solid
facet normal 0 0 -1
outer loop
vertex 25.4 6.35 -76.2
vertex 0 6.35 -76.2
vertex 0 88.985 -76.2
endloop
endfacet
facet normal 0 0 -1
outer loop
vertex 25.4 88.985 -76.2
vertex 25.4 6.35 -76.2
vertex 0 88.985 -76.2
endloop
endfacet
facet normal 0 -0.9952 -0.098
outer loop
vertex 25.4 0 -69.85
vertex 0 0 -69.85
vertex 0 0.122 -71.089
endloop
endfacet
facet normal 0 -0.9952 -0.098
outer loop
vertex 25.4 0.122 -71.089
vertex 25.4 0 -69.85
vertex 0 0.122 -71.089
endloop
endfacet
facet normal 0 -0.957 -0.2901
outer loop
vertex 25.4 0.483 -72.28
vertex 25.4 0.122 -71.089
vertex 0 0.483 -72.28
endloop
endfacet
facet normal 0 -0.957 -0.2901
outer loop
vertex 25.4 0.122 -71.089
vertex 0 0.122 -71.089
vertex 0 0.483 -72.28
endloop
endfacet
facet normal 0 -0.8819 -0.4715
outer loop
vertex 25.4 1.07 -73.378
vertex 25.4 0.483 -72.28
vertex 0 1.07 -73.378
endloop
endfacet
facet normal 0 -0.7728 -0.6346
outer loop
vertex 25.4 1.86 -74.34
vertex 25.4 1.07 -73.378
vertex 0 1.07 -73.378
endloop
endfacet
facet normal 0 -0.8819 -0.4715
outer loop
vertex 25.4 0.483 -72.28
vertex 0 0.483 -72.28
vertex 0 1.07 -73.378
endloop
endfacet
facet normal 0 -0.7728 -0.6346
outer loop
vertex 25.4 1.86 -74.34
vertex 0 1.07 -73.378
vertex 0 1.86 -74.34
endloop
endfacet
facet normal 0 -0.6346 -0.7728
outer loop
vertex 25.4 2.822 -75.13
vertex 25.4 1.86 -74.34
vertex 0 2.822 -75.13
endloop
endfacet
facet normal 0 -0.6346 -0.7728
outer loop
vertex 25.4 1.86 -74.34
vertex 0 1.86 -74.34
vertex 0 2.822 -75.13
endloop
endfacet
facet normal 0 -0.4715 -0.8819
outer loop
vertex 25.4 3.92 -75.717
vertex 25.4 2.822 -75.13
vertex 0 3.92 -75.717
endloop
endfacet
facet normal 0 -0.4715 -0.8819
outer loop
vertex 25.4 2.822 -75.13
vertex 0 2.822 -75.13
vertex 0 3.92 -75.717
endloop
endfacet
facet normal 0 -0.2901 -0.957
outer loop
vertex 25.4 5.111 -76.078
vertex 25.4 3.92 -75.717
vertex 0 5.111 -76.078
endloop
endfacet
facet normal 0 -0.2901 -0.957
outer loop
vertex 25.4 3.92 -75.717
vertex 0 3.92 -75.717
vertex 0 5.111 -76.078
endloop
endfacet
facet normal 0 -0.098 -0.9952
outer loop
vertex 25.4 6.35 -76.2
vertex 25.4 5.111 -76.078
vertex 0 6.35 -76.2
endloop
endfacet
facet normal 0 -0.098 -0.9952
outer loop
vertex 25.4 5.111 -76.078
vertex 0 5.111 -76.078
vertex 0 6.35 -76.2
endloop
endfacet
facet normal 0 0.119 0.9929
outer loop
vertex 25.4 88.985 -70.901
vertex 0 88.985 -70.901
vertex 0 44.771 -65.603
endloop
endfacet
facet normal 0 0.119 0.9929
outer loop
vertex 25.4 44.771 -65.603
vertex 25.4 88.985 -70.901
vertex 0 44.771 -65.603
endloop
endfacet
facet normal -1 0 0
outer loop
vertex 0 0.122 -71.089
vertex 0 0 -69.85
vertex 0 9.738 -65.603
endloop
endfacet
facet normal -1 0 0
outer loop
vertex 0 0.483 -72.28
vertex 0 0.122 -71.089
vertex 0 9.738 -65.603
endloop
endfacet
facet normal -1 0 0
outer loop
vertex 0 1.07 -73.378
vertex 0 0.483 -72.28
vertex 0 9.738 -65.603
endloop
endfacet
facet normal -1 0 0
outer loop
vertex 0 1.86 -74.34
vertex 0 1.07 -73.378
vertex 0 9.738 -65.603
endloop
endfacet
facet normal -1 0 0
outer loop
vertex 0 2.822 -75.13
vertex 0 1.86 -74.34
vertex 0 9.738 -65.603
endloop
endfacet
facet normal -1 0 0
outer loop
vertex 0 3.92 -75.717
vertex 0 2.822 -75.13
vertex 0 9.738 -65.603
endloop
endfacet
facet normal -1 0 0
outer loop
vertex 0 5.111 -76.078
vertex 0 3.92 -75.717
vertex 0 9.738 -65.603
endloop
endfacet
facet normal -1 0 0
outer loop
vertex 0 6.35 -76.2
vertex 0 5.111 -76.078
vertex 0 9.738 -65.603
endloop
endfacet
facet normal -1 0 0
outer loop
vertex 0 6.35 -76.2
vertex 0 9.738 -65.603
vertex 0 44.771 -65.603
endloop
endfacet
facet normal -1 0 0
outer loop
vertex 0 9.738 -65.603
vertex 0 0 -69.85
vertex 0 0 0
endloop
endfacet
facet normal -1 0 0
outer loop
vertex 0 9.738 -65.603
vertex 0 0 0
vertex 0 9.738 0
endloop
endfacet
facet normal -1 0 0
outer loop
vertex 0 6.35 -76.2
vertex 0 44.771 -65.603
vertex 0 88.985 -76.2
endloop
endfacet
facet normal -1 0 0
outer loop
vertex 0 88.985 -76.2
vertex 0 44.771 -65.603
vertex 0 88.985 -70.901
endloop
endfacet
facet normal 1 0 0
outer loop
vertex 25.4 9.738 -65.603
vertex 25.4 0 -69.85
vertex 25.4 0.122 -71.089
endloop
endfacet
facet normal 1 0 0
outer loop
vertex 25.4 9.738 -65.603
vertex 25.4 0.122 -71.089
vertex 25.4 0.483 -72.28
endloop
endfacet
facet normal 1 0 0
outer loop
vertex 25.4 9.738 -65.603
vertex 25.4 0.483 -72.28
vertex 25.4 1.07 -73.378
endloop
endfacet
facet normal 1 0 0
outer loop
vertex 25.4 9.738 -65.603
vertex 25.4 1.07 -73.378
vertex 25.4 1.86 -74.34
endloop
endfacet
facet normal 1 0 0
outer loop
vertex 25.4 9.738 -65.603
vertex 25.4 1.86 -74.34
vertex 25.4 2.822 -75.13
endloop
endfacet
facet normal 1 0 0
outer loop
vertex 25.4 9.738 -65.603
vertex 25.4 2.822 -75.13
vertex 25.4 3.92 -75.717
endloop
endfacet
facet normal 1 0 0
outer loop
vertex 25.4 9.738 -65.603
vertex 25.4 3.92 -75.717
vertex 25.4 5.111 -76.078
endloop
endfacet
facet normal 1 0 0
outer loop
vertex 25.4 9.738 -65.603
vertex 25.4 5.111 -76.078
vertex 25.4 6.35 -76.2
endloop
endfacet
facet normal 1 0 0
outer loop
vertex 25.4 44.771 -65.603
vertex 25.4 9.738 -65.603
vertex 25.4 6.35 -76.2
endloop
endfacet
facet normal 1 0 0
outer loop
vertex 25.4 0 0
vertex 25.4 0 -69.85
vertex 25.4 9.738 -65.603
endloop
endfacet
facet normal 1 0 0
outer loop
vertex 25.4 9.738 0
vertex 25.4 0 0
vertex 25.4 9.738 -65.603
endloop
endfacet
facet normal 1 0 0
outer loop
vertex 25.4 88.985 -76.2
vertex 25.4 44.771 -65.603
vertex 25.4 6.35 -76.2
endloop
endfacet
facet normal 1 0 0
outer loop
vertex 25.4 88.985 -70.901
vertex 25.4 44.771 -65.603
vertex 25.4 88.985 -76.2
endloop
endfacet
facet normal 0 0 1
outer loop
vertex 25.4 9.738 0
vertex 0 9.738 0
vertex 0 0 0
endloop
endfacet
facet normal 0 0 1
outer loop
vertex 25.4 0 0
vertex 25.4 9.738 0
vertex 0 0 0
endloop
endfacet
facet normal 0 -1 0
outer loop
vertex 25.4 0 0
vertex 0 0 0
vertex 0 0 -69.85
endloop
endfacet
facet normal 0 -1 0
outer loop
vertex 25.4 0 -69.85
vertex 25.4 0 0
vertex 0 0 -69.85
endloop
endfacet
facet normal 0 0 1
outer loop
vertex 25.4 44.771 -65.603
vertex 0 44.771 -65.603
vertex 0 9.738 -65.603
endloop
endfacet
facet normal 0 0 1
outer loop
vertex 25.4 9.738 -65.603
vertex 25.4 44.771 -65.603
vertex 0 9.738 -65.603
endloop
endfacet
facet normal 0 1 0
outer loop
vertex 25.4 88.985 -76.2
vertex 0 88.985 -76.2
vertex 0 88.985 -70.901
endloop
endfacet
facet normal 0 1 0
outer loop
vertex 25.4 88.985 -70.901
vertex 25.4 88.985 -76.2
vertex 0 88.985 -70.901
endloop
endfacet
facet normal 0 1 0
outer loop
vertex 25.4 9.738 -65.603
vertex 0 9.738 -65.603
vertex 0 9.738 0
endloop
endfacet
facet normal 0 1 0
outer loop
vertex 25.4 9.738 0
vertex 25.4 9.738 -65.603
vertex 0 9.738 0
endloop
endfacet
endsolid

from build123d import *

# Parameters (mm, degrees)
F1_DEPTH = 25.4


with BuildPart() as f1:
    # F0 (on Right) → F1 (new body)
    with BuildSketch(Plane.YZ):
        with BuildLine():
            Line((9.737576, 0), (0, 0))
            Line((0, 0), (0, -69.85))
            ThreePointArc((0, -69.85), (1.859872, -74.340128), (6.35, -76.2))
            Line((6.35, -76.2), (88.985146, -76.2))
            Line((88.985146, -76.2), (88.985146, -70.901472))
            Line((88.985146, -70.901472), (44.77061, -65.602944))
            Line((44.77061, -65.602944), (9.737576, -65.602944))
            Line((9.737576, -65.602944), (9.737576, 0))
        make_face()
    extrude(amount=F1_DEPTH)


solid = f1.part
